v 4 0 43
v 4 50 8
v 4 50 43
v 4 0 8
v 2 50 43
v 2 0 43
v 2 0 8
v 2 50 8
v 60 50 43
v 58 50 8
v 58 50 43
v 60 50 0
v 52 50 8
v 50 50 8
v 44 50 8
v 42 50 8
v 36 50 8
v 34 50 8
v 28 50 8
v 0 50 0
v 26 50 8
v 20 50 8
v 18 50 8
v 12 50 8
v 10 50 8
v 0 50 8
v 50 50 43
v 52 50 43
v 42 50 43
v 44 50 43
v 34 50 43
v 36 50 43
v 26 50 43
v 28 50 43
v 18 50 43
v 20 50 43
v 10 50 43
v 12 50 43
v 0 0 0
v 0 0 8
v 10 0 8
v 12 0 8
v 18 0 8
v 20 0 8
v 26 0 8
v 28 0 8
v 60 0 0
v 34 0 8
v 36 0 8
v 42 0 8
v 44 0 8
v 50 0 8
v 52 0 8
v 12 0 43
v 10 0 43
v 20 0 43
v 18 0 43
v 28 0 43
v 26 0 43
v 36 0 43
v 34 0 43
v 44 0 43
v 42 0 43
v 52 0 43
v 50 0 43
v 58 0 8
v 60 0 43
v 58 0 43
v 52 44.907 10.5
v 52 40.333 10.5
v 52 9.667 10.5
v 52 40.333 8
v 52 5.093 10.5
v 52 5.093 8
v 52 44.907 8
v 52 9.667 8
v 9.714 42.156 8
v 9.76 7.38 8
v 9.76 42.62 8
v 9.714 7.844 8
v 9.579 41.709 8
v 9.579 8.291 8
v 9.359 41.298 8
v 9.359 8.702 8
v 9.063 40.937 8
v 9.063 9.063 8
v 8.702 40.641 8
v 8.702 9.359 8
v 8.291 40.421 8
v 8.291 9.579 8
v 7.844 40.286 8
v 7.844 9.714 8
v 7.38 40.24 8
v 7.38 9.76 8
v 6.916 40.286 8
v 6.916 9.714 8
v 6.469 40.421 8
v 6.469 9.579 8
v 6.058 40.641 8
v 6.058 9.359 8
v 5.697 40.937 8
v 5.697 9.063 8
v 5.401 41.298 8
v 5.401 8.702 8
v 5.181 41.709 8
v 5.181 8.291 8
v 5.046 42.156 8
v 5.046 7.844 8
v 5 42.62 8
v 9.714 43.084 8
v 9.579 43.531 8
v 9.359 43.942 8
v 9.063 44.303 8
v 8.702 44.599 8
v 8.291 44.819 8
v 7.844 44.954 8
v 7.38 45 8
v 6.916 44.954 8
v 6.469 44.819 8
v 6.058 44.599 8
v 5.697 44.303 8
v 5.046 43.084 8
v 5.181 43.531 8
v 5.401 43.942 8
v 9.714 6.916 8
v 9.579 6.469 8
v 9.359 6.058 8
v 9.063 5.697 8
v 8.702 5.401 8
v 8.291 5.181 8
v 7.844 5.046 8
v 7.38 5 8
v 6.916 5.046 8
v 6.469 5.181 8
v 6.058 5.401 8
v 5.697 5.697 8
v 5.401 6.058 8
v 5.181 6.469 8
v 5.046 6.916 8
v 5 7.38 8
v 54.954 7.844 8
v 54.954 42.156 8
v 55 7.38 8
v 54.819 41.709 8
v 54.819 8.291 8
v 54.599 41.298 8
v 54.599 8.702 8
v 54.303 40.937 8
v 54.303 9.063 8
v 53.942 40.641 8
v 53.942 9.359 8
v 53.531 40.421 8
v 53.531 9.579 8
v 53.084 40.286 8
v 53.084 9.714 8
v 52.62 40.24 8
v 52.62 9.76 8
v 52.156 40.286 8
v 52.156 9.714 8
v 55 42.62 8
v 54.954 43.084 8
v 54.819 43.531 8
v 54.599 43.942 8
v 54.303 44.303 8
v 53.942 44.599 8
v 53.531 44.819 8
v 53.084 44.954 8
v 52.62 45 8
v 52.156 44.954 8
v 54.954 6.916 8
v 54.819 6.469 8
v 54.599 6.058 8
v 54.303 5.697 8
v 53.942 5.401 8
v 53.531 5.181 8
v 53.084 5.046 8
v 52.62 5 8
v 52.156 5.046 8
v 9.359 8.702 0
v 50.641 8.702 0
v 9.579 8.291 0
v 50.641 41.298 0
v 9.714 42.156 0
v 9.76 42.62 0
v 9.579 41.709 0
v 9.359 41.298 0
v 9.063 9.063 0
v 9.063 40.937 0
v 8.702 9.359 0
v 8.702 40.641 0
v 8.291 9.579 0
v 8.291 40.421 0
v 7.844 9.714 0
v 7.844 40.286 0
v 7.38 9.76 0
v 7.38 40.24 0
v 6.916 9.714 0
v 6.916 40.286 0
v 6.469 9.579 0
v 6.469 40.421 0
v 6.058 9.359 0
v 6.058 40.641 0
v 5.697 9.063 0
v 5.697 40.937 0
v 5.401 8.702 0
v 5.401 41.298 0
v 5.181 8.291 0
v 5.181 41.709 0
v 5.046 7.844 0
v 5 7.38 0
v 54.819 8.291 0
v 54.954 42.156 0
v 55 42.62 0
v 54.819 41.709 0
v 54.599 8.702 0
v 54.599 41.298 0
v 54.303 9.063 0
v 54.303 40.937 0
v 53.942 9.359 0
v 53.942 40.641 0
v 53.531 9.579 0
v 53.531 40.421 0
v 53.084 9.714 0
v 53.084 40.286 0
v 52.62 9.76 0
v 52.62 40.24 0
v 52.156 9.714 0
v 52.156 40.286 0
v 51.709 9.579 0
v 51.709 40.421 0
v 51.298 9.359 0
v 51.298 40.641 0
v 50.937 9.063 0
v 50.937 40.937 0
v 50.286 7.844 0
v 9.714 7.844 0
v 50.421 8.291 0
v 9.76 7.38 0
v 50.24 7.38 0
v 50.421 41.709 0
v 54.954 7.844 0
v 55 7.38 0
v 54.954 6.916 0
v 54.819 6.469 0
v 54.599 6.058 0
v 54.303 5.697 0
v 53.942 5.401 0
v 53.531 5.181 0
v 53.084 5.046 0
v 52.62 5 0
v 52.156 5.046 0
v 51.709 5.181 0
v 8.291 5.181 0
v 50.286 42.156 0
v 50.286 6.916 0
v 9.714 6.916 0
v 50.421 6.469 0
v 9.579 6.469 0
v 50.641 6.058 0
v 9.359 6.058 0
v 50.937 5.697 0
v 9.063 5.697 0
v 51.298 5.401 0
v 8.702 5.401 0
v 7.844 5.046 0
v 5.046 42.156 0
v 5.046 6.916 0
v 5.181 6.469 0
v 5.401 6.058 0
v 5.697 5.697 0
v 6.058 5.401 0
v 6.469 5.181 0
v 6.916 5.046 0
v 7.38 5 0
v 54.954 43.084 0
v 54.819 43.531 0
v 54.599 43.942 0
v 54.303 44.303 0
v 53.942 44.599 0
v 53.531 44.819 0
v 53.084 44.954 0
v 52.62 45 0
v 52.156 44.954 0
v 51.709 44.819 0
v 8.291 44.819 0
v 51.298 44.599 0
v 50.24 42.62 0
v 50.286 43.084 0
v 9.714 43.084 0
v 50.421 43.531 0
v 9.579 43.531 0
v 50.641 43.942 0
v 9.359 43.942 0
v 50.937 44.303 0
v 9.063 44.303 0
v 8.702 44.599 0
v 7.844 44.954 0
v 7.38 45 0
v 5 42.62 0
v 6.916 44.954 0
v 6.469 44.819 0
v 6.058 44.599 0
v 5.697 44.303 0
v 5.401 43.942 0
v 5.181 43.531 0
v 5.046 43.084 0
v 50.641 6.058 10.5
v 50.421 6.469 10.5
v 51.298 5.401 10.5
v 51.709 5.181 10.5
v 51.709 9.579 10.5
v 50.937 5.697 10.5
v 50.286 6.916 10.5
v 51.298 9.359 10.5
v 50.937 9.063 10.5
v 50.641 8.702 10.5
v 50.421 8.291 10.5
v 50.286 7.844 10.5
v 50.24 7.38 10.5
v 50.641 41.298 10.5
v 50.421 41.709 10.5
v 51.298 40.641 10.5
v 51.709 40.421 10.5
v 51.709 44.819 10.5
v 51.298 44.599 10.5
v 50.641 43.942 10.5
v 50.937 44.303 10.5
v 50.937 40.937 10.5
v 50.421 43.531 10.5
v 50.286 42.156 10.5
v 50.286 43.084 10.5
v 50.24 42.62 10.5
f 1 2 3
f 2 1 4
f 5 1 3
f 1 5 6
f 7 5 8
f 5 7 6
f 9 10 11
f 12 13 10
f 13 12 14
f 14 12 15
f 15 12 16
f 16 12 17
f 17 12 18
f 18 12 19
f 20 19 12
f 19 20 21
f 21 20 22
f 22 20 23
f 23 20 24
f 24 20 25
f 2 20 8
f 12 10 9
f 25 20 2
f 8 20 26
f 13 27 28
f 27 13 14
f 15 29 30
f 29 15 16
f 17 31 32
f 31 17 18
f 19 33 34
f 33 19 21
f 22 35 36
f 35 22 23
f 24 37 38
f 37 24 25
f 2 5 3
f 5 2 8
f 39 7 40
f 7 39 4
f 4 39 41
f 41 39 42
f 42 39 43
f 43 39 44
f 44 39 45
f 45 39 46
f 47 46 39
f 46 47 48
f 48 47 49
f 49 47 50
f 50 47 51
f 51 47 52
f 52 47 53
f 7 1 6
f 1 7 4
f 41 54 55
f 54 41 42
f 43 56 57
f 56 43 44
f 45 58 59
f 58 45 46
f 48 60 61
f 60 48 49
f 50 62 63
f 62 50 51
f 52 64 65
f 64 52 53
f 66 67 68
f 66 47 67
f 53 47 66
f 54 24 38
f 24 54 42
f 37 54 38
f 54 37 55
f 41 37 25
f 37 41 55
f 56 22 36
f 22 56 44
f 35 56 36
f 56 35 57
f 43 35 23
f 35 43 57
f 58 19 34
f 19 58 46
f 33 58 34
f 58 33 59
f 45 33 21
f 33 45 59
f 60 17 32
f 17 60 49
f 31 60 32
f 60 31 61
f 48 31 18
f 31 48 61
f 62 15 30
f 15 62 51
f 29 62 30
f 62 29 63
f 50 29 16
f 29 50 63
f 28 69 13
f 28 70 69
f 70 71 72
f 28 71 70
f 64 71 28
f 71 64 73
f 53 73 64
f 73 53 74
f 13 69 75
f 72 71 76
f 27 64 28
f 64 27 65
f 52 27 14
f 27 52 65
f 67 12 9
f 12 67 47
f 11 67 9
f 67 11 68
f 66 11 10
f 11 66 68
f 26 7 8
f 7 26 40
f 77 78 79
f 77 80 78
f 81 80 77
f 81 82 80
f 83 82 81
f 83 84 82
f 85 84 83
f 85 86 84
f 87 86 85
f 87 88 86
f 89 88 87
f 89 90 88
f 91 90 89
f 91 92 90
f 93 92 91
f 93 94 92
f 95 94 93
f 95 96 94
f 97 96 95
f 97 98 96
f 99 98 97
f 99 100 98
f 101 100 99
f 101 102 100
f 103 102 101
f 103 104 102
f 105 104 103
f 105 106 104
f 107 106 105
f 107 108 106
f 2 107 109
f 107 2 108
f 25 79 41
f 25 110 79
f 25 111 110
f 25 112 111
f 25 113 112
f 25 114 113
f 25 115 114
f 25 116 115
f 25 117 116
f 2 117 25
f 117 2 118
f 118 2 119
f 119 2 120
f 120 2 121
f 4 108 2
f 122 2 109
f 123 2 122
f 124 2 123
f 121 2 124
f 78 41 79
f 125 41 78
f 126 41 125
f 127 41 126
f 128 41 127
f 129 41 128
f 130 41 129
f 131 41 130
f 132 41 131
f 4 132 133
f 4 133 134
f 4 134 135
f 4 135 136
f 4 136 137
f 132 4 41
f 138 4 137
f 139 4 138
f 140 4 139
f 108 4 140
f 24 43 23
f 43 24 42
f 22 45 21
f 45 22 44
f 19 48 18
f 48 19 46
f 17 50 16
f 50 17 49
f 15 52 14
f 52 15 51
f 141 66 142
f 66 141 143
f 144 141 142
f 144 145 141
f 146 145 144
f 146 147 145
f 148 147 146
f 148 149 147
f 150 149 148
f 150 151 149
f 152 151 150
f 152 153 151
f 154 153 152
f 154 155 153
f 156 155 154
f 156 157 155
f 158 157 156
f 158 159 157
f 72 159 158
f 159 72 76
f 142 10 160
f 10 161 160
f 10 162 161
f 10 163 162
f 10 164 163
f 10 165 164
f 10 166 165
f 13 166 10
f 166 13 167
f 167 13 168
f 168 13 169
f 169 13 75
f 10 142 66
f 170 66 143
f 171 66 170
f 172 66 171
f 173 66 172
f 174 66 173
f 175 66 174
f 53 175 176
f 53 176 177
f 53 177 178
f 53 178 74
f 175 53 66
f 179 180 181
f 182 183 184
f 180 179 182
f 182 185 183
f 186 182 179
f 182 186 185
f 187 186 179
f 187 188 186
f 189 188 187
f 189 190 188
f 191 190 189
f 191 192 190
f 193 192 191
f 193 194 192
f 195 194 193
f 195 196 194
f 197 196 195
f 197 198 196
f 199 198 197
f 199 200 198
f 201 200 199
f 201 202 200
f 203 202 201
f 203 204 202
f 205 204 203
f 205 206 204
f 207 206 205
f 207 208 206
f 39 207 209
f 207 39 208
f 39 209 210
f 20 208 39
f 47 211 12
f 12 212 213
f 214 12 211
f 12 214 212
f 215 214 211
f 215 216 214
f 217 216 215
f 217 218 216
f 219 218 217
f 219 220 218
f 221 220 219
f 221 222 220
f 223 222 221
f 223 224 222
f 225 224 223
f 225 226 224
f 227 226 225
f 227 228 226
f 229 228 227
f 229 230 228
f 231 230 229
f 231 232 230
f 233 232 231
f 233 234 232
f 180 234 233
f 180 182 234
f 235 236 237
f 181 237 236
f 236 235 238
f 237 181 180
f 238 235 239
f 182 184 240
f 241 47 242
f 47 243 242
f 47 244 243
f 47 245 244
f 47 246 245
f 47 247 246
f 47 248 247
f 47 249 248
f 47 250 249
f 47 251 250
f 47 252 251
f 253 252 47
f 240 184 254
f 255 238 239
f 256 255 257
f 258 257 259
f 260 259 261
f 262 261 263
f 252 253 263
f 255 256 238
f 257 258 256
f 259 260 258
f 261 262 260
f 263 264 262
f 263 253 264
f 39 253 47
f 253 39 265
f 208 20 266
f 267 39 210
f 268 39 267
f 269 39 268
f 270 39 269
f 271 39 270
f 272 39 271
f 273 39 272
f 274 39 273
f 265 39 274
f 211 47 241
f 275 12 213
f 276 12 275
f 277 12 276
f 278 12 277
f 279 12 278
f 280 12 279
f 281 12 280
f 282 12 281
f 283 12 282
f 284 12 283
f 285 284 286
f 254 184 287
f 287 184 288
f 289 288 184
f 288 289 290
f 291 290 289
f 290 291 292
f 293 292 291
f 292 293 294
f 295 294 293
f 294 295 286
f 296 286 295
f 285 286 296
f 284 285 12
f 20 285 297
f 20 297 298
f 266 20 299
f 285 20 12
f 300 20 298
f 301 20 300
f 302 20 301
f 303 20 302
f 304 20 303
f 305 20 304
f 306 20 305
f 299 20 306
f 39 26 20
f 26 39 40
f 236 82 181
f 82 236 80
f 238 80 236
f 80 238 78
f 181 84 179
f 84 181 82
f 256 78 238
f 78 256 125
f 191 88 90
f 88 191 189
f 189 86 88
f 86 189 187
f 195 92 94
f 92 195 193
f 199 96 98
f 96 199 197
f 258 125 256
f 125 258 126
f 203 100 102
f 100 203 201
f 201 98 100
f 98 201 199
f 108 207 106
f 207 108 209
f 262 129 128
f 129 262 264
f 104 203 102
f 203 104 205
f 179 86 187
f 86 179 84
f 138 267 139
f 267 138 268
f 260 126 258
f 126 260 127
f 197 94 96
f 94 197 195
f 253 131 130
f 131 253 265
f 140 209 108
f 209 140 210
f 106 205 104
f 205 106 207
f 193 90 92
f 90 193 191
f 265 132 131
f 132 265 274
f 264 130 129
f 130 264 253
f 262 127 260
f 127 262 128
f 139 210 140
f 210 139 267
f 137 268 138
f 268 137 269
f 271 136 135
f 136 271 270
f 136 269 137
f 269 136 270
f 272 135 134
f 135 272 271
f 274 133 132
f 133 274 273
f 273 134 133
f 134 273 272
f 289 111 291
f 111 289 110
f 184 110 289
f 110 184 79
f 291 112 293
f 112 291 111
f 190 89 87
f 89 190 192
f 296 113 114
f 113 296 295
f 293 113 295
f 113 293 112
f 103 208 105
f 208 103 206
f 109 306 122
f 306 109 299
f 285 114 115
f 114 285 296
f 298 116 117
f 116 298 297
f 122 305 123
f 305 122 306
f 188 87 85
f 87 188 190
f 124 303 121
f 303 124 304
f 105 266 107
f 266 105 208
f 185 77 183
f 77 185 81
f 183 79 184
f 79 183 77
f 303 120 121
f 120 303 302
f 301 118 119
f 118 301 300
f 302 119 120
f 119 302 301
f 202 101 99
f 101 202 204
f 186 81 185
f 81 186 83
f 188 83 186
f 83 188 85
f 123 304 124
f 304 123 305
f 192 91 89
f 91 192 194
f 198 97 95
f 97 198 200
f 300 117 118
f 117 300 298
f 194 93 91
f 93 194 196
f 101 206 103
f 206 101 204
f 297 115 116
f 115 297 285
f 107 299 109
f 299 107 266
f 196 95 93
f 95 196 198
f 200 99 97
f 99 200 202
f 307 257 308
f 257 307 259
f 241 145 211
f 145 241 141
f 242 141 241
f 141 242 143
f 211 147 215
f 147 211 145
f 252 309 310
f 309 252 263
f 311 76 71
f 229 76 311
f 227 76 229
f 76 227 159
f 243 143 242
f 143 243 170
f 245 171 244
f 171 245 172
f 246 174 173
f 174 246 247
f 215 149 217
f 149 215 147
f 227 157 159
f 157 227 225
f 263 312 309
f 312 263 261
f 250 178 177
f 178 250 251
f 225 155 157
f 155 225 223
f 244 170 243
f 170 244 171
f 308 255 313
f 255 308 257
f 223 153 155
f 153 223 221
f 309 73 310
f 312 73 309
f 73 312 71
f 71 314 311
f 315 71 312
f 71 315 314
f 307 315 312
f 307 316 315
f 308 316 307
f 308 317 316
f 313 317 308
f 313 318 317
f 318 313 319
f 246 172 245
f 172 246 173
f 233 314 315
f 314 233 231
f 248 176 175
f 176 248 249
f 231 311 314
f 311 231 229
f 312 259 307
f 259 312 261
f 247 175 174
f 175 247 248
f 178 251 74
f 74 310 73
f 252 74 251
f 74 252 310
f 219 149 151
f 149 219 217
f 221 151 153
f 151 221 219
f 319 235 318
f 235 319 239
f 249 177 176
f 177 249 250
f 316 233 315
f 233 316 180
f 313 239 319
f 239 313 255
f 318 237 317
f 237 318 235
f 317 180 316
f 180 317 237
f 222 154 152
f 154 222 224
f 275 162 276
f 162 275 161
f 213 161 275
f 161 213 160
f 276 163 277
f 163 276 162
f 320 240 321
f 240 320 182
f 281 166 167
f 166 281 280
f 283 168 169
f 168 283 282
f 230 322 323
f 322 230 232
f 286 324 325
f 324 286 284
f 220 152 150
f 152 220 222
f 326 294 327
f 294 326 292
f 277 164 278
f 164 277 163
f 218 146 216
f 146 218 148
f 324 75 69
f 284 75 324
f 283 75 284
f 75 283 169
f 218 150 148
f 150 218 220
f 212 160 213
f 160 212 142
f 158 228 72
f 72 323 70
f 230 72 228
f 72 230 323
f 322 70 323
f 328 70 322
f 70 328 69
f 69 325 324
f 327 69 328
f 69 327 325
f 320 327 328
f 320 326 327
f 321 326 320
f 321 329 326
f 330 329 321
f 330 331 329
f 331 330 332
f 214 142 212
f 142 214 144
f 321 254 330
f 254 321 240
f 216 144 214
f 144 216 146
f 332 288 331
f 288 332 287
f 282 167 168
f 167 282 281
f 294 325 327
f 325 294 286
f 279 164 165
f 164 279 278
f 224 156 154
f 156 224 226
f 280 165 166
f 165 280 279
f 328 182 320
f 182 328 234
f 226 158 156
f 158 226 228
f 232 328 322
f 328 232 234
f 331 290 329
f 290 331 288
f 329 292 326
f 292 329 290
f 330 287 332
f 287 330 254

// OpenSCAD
$fn = 32;

// ----------------------------------------------------------------------
// Finned heat sink: 60 x 50 mm base, 35 mm fins
// ----------------------------------------------------------------------

// --- parameters (mm) ---
base_w = 60;              // base width
base_d = 50;              // base depth
base_t = 8;               // base thickness
fin_h = 35;               // fin height above the base
holes_d = 4.76;           // fixing holes
hole_x = 22.62;           // hole offset in x
hole_y = 17.62;           // hole offset in y
fin_t = 2;                // fin thickness
fin_pitch = 8;            // fin pitch
fin_count = 8;            // number of fins
fin_x0 = 2;               // first fin offset

difference() {
  union() {
    cube([base_w, base_d, base_t]);
    for (i = [0 : fin_count - 1]) {
      translate([fin_x0 + i * fin_pitch, 0, base_t - 0.5]) cube([fin_t, base_d, fin_h + 0.5]);
    }
  }
  /* fixing holes through the base, 2.5 mm clear on both sides */
  for (hx = [-22.62, 22.62]) {
    for (hy = [-17.62, 17.62]) {
      translate([base_w / 2 + hx, base_d / 2 + hy, -2.5]) cylinder(h = base_t + 5, d = holes_d);
    }
  }
}
